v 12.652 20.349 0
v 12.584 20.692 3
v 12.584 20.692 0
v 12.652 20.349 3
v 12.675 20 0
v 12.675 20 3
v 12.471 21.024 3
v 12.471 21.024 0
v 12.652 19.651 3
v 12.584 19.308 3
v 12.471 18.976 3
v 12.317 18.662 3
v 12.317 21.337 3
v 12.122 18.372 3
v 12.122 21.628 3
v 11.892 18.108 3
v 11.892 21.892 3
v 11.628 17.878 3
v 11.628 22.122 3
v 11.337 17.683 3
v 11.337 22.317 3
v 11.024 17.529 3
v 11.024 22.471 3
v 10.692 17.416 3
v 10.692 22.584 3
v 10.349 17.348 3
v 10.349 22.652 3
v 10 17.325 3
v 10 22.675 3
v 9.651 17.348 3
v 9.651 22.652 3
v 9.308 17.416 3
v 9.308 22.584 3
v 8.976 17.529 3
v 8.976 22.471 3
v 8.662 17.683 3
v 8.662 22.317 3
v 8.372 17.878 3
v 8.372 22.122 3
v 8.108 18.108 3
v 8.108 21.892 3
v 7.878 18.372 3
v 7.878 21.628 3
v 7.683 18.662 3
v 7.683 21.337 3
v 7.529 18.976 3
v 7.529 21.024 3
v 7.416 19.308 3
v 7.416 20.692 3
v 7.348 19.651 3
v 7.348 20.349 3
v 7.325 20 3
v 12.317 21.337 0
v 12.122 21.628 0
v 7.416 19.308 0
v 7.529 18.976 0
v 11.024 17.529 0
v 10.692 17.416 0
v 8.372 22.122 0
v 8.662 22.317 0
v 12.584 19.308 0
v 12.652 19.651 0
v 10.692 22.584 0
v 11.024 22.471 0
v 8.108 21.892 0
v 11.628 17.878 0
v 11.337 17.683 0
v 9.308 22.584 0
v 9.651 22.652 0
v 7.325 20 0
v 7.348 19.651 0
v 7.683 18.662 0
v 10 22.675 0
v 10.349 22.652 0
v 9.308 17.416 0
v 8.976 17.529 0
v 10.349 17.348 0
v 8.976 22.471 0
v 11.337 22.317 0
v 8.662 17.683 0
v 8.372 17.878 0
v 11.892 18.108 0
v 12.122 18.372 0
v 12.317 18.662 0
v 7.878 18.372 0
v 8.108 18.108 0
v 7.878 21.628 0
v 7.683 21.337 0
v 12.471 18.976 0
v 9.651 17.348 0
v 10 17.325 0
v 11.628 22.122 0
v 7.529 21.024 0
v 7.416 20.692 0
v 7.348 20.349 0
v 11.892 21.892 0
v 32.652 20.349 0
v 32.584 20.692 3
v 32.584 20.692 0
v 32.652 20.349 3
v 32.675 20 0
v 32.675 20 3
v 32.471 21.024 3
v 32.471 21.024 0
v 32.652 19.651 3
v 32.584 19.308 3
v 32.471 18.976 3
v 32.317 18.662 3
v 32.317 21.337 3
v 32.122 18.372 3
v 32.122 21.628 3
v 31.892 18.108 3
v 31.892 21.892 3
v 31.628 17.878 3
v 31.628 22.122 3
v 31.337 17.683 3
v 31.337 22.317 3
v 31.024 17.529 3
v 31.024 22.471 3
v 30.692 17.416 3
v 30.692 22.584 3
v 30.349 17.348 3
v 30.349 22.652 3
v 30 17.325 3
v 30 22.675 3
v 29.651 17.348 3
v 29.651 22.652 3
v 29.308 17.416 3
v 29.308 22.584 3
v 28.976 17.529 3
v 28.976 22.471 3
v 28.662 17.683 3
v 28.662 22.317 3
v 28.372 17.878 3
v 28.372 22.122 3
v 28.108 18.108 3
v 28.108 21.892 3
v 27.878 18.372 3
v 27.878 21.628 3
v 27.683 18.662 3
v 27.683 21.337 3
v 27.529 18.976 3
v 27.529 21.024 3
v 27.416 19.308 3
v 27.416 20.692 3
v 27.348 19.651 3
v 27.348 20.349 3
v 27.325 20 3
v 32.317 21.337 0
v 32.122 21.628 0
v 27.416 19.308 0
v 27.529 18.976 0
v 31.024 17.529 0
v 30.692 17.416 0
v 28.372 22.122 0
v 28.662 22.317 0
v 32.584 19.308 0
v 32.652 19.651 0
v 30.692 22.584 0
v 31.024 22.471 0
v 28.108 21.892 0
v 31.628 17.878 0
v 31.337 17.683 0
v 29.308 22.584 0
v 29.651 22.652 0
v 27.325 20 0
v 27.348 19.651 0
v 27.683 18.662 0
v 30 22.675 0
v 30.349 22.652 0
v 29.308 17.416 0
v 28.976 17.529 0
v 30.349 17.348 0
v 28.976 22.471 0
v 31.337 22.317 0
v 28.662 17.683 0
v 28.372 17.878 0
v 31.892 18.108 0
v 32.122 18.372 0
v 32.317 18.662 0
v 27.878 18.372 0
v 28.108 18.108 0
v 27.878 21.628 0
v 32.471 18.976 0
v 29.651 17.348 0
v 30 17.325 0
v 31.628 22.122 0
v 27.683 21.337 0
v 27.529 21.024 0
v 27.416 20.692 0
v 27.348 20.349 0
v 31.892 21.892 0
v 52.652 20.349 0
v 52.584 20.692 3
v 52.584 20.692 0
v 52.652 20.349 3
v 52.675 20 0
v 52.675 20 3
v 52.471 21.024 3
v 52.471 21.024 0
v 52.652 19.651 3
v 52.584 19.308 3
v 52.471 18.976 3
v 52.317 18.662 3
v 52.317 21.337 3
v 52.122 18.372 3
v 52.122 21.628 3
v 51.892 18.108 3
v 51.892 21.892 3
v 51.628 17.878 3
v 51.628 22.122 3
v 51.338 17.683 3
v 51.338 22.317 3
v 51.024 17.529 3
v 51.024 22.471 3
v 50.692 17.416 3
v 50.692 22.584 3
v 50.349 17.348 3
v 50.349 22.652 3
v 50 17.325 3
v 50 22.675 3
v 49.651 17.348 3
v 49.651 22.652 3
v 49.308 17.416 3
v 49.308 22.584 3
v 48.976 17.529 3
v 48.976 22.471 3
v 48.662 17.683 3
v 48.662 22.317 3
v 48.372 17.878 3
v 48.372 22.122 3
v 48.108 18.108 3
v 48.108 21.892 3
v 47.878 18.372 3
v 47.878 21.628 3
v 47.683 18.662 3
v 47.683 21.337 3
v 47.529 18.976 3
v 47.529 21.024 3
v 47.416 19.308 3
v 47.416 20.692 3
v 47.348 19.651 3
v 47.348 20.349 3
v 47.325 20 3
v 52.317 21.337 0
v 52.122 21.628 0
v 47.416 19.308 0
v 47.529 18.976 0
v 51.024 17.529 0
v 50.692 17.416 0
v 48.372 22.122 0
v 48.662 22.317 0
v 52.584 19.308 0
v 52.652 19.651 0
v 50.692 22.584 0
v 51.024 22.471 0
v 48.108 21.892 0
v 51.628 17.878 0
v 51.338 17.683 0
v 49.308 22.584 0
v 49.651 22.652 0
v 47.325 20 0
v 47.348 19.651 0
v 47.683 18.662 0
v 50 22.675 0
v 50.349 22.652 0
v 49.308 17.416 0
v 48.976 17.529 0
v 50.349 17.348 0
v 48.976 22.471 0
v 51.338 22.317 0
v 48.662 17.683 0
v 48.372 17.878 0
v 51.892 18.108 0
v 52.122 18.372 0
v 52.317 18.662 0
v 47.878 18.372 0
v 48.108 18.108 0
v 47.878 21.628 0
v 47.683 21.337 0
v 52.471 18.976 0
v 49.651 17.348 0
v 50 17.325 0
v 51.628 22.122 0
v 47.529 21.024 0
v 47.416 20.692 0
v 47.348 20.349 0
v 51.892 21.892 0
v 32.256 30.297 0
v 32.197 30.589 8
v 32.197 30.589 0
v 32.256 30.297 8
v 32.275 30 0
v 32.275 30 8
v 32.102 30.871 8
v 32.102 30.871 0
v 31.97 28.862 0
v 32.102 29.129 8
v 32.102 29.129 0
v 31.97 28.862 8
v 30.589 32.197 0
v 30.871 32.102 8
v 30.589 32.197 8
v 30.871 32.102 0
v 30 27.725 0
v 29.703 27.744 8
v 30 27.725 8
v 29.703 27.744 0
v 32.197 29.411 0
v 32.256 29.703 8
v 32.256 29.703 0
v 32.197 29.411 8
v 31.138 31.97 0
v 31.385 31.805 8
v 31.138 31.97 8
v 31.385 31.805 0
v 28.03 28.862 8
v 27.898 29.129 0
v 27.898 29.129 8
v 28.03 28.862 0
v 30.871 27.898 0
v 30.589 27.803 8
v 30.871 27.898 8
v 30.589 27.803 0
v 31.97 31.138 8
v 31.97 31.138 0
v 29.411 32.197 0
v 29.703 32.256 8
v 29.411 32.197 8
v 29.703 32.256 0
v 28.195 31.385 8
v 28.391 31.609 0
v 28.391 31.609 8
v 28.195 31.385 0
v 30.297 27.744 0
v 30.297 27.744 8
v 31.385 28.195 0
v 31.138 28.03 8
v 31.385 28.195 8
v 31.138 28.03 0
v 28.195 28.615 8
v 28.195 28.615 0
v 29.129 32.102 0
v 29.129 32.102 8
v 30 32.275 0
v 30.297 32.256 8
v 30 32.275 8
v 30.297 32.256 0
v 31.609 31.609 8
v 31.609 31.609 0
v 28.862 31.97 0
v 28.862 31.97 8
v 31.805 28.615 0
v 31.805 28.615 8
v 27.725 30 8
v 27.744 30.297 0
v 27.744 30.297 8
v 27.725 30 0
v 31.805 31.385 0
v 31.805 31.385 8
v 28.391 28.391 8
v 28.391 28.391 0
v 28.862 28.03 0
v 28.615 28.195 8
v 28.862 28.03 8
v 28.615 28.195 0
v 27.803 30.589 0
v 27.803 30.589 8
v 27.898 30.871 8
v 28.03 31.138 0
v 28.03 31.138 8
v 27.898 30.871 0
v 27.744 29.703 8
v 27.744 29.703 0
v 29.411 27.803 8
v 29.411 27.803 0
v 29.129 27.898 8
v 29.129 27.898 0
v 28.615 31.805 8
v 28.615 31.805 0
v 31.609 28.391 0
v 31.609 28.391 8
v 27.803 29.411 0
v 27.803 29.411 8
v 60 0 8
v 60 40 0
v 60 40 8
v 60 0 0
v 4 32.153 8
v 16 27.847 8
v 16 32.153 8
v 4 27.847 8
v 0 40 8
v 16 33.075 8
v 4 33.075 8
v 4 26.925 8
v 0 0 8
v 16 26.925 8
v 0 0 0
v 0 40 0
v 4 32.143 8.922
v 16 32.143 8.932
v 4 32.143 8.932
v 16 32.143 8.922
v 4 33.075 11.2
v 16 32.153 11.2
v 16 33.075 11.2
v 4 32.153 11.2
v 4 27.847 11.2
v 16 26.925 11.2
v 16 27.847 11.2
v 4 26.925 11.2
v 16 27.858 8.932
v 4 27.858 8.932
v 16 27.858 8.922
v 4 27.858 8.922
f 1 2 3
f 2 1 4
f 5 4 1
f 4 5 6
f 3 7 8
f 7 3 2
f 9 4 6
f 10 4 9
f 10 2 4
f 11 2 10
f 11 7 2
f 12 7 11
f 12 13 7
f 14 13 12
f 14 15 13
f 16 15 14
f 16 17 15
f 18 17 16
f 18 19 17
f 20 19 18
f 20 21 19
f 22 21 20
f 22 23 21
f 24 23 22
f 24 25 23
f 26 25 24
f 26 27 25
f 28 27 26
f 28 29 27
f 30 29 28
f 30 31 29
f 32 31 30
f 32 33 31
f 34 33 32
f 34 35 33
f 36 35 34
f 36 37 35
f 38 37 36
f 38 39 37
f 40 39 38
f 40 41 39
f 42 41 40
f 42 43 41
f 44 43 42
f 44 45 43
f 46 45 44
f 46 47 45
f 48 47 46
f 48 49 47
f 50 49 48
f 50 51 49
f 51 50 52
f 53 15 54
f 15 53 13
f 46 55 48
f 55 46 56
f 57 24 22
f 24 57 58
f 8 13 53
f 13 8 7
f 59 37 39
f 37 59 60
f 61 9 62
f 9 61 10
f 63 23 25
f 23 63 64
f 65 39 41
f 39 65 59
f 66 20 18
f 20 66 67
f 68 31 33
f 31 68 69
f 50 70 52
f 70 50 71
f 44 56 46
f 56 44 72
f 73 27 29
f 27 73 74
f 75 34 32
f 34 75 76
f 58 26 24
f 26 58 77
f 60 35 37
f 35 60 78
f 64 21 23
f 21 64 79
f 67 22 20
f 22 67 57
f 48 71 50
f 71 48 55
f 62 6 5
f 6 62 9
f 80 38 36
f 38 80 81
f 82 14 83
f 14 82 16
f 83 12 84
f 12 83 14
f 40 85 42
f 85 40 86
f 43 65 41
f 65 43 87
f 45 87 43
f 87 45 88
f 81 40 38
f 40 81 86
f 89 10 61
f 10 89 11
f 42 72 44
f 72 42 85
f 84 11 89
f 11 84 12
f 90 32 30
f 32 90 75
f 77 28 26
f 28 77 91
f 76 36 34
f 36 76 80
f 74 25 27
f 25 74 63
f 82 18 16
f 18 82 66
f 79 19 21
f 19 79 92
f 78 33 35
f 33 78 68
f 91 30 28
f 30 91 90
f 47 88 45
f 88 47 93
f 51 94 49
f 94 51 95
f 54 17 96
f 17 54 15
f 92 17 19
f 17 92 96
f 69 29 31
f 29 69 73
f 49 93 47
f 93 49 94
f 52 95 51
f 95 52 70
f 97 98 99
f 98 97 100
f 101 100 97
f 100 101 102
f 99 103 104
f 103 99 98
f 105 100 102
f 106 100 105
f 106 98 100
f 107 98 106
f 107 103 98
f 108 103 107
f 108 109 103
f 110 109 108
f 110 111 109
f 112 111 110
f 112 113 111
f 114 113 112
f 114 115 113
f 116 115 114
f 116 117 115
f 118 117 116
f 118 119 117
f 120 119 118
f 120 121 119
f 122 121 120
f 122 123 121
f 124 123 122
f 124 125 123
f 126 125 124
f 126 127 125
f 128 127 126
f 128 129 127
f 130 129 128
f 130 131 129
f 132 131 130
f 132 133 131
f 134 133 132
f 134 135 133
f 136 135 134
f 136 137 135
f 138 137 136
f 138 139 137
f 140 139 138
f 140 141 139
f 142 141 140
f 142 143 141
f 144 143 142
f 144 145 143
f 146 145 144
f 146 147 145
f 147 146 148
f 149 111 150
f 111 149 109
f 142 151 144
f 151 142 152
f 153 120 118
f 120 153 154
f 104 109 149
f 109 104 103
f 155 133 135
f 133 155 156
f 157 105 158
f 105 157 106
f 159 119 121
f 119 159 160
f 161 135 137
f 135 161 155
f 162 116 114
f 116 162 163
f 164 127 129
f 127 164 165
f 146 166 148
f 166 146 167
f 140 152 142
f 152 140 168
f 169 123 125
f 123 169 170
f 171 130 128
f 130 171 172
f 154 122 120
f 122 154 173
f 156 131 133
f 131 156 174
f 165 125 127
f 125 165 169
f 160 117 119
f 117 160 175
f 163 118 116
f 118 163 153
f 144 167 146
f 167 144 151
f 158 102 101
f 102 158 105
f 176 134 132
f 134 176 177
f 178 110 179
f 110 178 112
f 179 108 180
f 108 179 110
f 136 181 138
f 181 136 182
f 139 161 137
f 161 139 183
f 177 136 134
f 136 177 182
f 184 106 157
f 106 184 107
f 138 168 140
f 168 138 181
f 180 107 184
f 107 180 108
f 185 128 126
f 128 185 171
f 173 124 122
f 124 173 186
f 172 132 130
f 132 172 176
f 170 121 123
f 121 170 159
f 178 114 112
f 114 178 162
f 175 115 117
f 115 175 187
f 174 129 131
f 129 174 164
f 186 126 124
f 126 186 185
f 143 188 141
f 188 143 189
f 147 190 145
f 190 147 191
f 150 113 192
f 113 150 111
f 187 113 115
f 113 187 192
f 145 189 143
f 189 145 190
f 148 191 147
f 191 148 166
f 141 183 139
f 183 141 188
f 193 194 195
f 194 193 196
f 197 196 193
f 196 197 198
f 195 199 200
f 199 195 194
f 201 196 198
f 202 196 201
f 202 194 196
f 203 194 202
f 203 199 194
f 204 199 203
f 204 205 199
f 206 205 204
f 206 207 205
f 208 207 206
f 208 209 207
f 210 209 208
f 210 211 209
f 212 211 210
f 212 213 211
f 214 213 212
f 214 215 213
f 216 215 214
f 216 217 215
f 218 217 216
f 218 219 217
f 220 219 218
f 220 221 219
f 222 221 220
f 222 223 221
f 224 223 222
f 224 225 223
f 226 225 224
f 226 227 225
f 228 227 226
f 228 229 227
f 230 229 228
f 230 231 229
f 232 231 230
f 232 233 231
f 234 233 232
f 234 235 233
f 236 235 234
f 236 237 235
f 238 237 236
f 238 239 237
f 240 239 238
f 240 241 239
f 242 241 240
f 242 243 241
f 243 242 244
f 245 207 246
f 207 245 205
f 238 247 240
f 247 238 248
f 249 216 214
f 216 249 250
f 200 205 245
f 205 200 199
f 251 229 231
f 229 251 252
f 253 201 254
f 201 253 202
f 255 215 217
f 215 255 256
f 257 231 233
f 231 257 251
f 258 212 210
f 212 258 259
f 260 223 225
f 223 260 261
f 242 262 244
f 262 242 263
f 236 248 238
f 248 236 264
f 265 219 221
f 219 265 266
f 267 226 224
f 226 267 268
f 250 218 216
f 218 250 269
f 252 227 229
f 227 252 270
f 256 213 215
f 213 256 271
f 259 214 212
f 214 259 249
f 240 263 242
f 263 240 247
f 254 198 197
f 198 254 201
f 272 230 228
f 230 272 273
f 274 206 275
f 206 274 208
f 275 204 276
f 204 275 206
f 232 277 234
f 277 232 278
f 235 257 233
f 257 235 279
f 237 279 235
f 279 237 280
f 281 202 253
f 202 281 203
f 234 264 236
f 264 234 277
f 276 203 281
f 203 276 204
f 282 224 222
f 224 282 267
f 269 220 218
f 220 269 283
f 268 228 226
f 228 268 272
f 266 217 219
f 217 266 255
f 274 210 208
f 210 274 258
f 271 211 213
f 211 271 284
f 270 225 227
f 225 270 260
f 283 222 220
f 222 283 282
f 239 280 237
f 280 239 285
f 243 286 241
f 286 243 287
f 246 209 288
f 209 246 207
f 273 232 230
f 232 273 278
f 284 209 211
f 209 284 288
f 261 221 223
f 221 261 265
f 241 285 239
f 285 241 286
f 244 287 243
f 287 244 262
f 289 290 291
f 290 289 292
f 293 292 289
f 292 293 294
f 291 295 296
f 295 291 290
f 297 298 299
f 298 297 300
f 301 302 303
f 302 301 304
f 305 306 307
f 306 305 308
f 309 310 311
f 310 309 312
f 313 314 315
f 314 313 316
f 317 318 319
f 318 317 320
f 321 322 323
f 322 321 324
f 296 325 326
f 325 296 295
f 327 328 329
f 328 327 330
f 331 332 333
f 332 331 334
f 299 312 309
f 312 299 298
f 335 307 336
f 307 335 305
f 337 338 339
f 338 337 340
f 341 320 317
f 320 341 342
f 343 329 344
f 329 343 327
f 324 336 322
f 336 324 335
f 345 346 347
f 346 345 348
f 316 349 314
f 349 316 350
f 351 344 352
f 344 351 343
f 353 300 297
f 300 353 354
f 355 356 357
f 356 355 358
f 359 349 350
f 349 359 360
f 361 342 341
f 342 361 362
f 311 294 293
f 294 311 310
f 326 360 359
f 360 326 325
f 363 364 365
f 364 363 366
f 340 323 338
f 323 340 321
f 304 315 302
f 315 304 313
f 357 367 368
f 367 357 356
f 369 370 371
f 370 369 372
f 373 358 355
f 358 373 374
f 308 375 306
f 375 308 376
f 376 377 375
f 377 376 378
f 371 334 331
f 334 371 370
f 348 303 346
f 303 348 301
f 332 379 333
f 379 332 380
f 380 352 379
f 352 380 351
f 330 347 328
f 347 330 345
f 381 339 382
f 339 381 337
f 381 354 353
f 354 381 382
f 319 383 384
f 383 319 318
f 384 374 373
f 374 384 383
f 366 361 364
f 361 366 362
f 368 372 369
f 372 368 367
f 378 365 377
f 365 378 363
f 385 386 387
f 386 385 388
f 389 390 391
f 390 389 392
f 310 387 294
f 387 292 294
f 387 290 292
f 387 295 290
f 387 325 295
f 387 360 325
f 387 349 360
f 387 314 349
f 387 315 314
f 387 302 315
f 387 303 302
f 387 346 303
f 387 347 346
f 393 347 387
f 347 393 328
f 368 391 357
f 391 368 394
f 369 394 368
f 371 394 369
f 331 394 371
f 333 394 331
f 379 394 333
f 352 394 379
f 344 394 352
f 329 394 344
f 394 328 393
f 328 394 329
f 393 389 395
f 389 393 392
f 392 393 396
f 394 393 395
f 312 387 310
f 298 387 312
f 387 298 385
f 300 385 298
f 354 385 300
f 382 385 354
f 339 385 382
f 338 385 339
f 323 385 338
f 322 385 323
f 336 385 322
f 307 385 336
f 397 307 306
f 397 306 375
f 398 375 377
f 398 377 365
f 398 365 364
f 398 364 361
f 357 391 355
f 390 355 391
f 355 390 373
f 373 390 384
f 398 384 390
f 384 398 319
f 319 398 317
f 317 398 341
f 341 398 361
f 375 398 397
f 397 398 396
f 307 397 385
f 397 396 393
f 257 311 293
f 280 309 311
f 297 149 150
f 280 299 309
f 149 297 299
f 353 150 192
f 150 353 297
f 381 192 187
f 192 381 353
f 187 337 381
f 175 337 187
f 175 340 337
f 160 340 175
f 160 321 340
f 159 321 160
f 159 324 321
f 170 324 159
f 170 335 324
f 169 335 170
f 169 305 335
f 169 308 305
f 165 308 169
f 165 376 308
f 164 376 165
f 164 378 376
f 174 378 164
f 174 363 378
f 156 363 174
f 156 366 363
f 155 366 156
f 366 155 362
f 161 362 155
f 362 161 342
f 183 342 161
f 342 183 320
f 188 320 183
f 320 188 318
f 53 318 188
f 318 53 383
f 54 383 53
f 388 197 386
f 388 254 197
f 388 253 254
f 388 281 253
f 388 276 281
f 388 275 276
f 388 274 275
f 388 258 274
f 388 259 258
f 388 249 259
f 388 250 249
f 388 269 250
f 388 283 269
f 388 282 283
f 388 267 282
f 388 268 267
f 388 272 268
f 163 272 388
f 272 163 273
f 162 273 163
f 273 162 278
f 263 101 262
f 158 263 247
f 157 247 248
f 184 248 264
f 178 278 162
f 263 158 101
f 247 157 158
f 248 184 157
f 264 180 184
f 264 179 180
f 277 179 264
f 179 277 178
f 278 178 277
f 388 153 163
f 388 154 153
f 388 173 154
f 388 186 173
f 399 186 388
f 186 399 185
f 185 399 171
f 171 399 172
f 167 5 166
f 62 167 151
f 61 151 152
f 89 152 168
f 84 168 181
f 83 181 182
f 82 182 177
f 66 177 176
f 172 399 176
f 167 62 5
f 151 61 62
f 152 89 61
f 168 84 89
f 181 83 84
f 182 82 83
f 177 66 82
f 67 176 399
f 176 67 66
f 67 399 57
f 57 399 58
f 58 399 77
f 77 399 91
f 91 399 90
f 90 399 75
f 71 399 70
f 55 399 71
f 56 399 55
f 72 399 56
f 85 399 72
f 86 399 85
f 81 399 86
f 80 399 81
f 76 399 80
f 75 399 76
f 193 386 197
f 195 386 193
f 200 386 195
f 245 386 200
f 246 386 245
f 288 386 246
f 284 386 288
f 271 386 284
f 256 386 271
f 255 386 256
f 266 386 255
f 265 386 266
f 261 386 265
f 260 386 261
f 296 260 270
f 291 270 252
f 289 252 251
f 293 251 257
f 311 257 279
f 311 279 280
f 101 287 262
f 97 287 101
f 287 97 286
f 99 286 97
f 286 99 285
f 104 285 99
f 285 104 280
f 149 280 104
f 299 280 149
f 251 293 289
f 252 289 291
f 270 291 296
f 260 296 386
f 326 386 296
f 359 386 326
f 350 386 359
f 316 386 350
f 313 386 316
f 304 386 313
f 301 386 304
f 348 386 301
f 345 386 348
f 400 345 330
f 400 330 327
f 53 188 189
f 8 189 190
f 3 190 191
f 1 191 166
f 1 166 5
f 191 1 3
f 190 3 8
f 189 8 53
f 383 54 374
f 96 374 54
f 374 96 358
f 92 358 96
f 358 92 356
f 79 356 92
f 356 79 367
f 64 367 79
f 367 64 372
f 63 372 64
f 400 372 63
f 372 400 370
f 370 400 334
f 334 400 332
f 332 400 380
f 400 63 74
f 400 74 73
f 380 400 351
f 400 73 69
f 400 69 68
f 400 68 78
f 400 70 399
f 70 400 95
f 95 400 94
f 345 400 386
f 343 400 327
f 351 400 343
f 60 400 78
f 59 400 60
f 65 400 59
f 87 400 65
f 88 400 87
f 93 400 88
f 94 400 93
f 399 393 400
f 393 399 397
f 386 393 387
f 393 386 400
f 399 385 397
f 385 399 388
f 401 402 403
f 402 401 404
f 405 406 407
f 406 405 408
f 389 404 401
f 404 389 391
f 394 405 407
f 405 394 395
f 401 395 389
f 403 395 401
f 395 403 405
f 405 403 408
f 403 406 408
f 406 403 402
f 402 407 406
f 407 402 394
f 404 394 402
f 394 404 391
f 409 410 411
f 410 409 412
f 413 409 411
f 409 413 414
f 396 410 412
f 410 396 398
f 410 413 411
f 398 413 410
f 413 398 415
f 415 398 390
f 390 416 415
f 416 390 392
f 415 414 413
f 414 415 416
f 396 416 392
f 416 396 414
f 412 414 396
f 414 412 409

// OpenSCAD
// file: tslot_2020.consts.scad
// GENERATED from spec.json by scripts/gen-consts.mjs — DO NOT EDIT.
// interface: tslot_2020 v0.1.0

PROFILE__SIZE = 20;
PROFILE__SLOT_GAP = 6;
PROFILE__SLOT_DEPTH = 6;
PROFILE__BORE_D = 4.2;
PROFILE__SIZE_2040 = 40;
TNUT__BODY_W = 5.8;
TNUT__BODY_T = 3.2;
TNUT__STEM_THREAD = 5;
TNUT__LENGTH = 12;
BRACKET__HOLE_PITCH = 20;
BRACKET__HOLE_D = 5;
BRACKET__THICKNESS = 3;
BRACKET__LEG = 20;
// file: ../../lib/asm.scad
// ============================================================================
// lib/asm.scad — typed mating features, mirroring the engine's assembly.scad
// ----------------------------------------------------------------------------
// Same signatures, same geometry language, same conventions as the main
// engine (Procedura lib/assembly.scad):
//   * MALE / additive solids  (asm_peg)   -> union() onto the part.
//   * FEMALE / negative tools (asm_socket) -> subtract from the part.
//   * every male tip and female mouth carries a lead-in chamfer so parts
//     self-centre as they seat.
//   * male and female pair from ONE shared nominal + signed fit offset.
// The fit values come from lib/fits.scad — nothing here owns a tolerance.

include <fits.scad>;

// ---- peg ↔ socket ----------------------------------------------------------
// MALE peg, base at origin, growing +Z, chamfered self-centring tip.
module asm_peg(d, len) {
    lead = fit_lead(d);
    union() {
        cylinder(h = max(0.01, len - lead), d = d);
        translate([0, 0, len - lead])
            cylinder(h = lead, d1 = d, d2 = max(0.2, d - 2 * lead));
    }
}

// FEMALE socket, cut from the SAME nominal as its peg. Bore grows with the
// fit class; mouth chamfer eases insertion.
module asm_socket(d, depth, cls = "location") {
    bore = fit_d(d, cls);
    lead = fit_lead(bore);
    union() {
        translate([0, 0, -0.01]) cylinder(h = depth + 0.02, d = bore);
        translate([0, 0, depth - lead])
            cylinder(h = lead + 0.01, d1 = bore, d2 = bore + 2 * lead);
    }
}

// ---- through hole / counterbore --------------------------------------------
// Plain through hole for a fastener of nominal thread d, ISO-273-style.
module asm_through_hole(d, cls = "clearance") {
    bore = fit_d(d, cls);
    lead = fit_lead(bore);
    union() {
        translate([0, 0, -0.01]) cylinder(h = 100000, d = bore, center = false);
        // both mouths chamfered
        translate([0, 0, -0.01 + 100000 - 0.01]) cylinder(h = lead, d1 = bore, d2 = bore + 2 * lead);
    }
}

// Counterbore for a cap/button head: head pocket + shank clearance, both
// derived from the same nominal head diameter and thread.
module asm_counterbore(head_d, head_k, thread_d, cls = "clearance") {
    lead = fit_lead(head_d);
    union() {
        asm_through_hole(thread_d, cls);
        translate([0, 0, -0.01])
            cylinder(h = head_k + fit_delta_d("location"), d = fit_d(head_d, cls));
        translate([0, 0, head_k + fit_delta_d("location") - lead])
            cylinder(h = lead + 0.01, d1 = fit_d(head_d, cls), d2 = fit_d(head_d, cls) + 2 * lead);
    }
}

// ---- nut traps ---------------------------------------------------------------
// Hex nut trap: across-flats s, nut thickness m, from the SAME s.
// Oriented flat-down, opening at -Z (subtract from the part's underside).
module asm_hex_nut_trap(s, m, cls = "location") {
    af = fit_d(s, cls);
    translate([0, 0, -0.01]) {
        cylinder(h = m + fit_delta_d("location") + 0.01, d = af / cos(30), $fn = 6);
        // lead-in on the outer mouth (deeper into the part is -Z here)
        translate([0, 0, m + fit_delta_d("location") - 0.01])
            cylinder(h = fit_lead(af), d1 = af / cos(30), d2 = af / cos(30) + 2 * fit_lead(af), $fn = 6);
    }
}

// Square nut trap: side s, thickness m.
module asm_square_nut_trap(s, m, cls = "location") {
    side = fit_d(s, cls);
    lead = fit_lead(side);
    translate([0, 0, -0.01]) {
        translate([-side / 2, -side / 2, 0])
            cube([side, side, m + fit_delta_d("location") + 0.01]);
        translate([-side / 2, -side / 2, m + fit_delta_d("location") - 0.01])
            cube([side + 2 * lead, side + 2 * lead, lead + 0.02]);
    }
}

// ---- heat-set insert boss -----------------------------------------------------
// Solid boss (MALE — union it on): outer bore holds a brass insert of
// insert_od/insert_len; the top is counterbored so the insert sits flush.
module asm_insert_boss(insert_od, insert_len, wall = 2.4, cls = "snug") {
    bore = fit_d(insert_od, cls);
    od = bore + 2 * wall;
    difference() {
        cylinder(d = od, h = insert_len + wall);
        translate([0, 0, wall])
            cylinder(d = bore, h = insert_len + 0.01);
        // entry chamfer at the insert mouth
        translate([0, 0, wall - fit_lead(bore) + fit_lead(bore)])
            cylinder(h = fit_lead(bore), d1 = bore + 2 * fit_lead(bore), d2 = bore);
    }
}
// file: ../../lib/fits.scad
// ============================================================================
// lib/fits.scad — fit classes and the tolerance table
// ----------------------------------------------------------------------------
// Every mating feature in this library derives its clearance from THIS table,
// never from a second literal. Mirrors the engine's assembly.scad convention
// (asm_socket bore = nominal + signed fit offset) with the engine's class
// names aliased for compatibility ("press" == "snug").
//
// !! STARTING HYPOTHESES, NOT MEASUREMENTS !!
// These are diametral deltas for a 0.4 mm-nozzle FDM printer, PLA, default
// wall settings. They are corrected by physically printing each interface's
// gauge.scad and recording which class actually fits — see README § gauges.
// Until those prints happen and the table is updated, treat every generated
// fit as provisional.

// Diametral offsets (mm), keyed by class. Radial = half these values.
fit_delta = [
  ["clearance", 0.35],  // slides freely
  ["location",  0.15],  // assembles by hand, no slop
  ["snug",     -0.05],  // press fit, needs force
  ["press",    -0.05],  // engine alias for snug
  ["snap",      0.20],  // engine class kept for compatibility
];

function fit_delta_d(cls) =
    let (hit = [for (e = fit_delta) if (e[0] == cls) e[1]])
    len(hit) == 1 ? hit[0]
  : assert(false, str("unknown fit class '", cls, "'")) 0;

// Radial offset — the engine's asm_fit convention (asm_socket adds 2× this).
function fit_delta_r(cls) = fit_delta_d(cls) / 2;

// Resolve a nominal through a fit class: the ONE place tolerances enter.
function fit_d(nominal, cls) = nominal + fit_delta_d(cls);

// Lead-in chamfer length for a feature of diameter d — self-centring mouth.
// Same formula as the engine (max(0.6, 0.15*d)) so parts generated against
// either library seat identically.
function fit_lead(d) = max(0.6, 0.15 * d);
// file: tslot_2020.scad
// ============================================================================
// interfaces/tslot_2020/tslot_2020.scad
// ----------------------------------------------------------------------------
// Features for 2020/2040 V-slot extrusion (6.0 mm gap variant). Numbers come
// from the GENERATED consts; fits from lib/fits.scad.

use <../../lib/fits.scad>;
use <../../lib/asm.scad>;
include <tslot_2020.consts.scad>;

// MALE: T-nut body that slides into the slot gap. Base at z=0 on the slot
// mouth plane, body extends +Z into the slot. The stem hole is NOT cut —
// subtract tnut_stem_hole where you want the thread.
module tnut_body(len = TNUT__LENGTH, cls = "clearance") {
    w = fit_d(TNUT__BODY_W, cls);
    t = TNUT__BODY_T;
    // sliding bar inside the slot; both ends chamfered along y so it
    // enters the gap square-on without catching the lips
    for (my = [0, 1])
        mirror([0, my, 0])
            hull() {
                translate([-len / 2, w / 2 - fit_lead(w), 0])
                    cube([len, 0.01, t]);
                translate([-len / 2, w / 2 - fit_lead(w) - 0.01, fit_lead(w)])
                    cube([len, 0.01, 0.01]);
                translate([-len / 2, w / 2 - 0.01, 0]) cube([len, 0.01, t]);
            }
}

// FEMALE: thread hole through the T-nut stem (M5 for the common V-slot nut).
module tnut_stem_hole(cls = "clearance") {
    asm_through_hole(TNUT__STEM_THREAD, cls);
}

// FEMALE: end-face bolt hole into the extrusion's central bore (M4/M5 into
// the 4.2 mm bore — location fit lets an M4 self-tap, clearance suits M5).
module tslot_end_bolt_hole(cls = "location") {
    asm_through_hole(PROFILE__BORE_D, cls);
}

// FEMALE: corner-bracket bolt pattern for one face — holes on the 20 mm
// profile grid, cut through the given thickness. Origin at the face's corner,
// first hole inset half a profile from both edges.
module tslot_bracket_face(thickness = BRACKET__THICKNESS, cls = "clearance") {
    inset = PROFILE__SIZE / 2;
    translate([inset, inset, -0.01])
        cylinder(h = thickness + 0.02, d = fit_d(BRACKET__HOLE_D, cls));
}

// MALE: corner bracket solid (L-shape): base leg on the XY plane (z 0..t),
// upright rising at x 0..t. One M5 hole per leg, centred on the 20 mm grid
// (10 mm from the inside corner). Base at z=0.
module tslot_corner_bracket(cls = "clearance") {
    t = BRACKET__THICKNESS;
    leg = BRACKET__LEG;
    hole_d = fit_d(BRACKET__HOLE_D, cls);
    c = PROFILE__SIZE / 2; // hole centre, 10 mm from the inside corner
    difference() {
        union() {
            cube([leg, leg, t]);              // base leg, holes along z
            translate([0, 0, t]) cube([t, leg, leg]); // upright, holes along x
        }
        // base-leg hole: through z
        translate([c, c, -0.01]) cylinder(h = t + 0.02, d = hole_d);
        // upright hole: through x, one profile height up
        rotate([0, 90, 0]) translate([-t - c, c, -0.01])
            cylinder(h = t + 0.02, d = hole_d);
    }
}
// main file
// ============================================================================
// test.scad — assertion fixture for tslot_2020
// ----------------------------------------------------------------------------
// Plate 60x40x8. The bracket-face pattern is a 3 mm pocket cut from the
// bottom (fixture x=0/20/40 + the module's own 10 mm inset → holes at
// x=10/30/50, y=20, 20 mm pitch). End-bolt through bore at (30, 30).
// T-nut body (MALE) stands on top at (10, 30). Section z=1.5 sits inside the
// pocket: 3 bracket holes + the through bore.

use <tslot_2020.scad>;

$fn = 48;

module test_plate() {
    difference() {
        cube([60, 40, 8]);
        for (x = [0, 20, 40])
            translate([x, 10, -0.01]) tslot_bracket_face();
        translate([30, 30, -0.01]) tslot_end_bolt_hole("clearance");
    }
    // T-nut body standing on the top face (extends +Z from the plate)
    translate([10, 30, 8]) tnut_body();
}

test_plate();
